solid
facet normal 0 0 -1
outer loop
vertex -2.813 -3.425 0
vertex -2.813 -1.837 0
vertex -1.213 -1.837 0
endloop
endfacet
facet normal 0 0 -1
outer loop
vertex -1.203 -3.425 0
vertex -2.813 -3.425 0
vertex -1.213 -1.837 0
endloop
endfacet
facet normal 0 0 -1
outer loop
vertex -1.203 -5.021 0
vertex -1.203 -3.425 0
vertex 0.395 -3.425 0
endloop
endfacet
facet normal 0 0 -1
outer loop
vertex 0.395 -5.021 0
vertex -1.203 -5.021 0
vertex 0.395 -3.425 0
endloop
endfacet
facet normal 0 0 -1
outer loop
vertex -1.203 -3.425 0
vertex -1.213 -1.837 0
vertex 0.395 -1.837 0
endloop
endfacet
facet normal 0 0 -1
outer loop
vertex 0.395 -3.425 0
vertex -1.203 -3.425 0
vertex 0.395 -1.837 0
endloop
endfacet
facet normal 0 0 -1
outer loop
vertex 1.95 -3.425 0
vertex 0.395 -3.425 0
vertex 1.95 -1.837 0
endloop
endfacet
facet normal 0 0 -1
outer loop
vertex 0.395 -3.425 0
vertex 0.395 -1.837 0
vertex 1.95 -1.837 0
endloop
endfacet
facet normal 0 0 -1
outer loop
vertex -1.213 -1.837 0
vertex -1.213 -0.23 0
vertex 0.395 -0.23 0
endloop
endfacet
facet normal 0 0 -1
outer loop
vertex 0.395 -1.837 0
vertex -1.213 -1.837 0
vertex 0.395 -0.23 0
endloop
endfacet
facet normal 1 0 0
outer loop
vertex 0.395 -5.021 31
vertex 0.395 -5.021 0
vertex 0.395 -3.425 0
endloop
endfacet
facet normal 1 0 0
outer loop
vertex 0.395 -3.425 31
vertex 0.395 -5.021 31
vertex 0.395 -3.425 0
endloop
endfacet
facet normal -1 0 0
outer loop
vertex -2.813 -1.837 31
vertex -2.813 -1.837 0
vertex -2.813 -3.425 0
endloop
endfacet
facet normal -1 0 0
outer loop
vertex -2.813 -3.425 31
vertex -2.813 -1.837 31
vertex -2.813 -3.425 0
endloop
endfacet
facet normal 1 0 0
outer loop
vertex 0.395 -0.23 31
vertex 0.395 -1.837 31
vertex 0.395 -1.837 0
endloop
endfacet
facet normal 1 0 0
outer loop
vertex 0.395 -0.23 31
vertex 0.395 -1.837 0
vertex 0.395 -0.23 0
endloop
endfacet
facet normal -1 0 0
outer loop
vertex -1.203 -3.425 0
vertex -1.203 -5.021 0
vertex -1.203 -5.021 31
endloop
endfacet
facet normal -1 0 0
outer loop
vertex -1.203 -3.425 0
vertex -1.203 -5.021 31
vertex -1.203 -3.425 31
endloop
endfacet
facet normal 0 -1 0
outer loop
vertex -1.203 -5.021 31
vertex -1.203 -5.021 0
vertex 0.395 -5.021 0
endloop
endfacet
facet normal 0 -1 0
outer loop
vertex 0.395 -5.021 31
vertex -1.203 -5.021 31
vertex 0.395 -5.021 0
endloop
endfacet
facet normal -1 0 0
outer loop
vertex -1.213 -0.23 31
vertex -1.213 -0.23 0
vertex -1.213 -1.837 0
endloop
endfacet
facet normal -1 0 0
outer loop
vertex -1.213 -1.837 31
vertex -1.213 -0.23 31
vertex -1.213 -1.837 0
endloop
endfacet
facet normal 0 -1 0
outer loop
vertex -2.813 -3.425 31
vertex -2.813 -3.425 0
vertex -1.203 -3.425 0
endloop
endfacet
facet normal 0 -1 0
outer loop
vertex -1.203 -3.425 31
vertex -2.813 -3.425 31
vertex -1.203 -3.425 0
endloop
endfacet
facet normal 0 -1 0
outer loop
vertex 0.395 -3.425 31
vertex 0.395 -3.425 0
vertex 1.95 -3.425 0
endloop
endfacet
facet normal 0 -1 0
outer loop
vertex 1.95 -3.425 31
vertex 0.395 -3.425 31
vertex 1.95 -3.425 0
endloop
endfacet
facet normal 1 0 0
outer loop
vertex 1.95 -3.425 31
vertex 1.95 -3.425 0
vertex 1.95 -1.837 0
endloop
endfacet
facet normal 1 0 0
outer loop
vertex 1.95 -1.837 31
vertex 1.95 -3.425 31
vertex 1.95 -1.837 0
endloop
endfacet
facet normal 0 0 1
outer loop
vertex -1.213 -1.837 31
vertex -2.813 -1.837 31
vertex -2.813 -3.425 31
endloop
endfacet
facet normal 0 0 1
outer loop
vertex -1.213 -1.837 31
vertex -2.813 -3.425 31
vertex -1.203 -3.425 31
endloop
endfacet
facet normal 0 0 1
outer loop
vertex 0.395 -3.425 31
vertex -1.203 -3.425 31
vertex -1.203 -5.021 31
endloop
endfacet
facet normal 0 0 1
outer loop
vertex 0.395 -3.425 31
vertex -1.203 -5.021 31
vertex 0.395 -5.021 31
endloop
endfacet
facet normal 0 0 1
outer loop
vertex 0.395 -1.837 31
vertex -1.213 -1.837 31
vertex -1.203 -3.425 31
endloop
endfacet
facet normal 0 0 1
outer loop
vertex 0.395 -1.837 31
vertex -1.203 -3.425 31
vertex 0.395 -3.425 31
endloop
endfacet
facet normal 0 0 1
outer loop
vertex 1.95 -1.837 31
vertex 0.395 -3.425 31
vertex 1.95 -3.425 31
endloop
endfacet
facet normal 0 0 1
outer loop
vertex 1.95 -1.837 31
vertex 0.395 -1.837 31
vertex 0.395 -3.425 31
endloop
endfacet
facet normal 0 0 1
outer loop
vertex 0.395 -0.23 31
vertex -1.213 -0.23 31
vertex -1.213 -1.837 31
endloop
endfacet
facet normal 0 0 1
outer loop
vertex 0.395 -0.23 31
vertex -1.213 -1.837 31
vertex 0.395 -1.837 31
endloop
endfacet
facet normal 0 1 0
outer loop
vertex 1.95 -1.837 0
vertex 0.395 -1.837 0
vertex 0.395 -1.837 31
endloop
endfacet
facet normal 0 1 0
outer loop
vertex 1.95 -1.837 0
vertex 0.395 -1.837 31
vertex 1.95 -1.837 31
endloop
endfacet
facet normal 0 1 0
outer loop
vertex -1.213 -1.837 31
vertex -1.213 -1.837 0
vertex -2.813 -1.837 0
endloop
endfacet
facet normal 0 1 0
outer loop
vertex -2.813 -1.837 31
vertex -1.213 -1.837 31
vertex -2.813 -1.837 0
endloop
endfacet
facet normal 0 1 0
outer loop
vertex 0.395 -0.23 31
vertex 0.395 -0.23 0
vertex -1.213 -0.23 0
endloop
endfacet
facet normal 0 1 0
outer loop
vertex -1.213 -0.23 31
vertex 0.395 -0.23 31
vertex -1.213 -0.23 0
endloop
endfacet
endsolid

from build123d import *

# Parameters (mm, degrees)
F0_W     = 1.598067
F0_H     = 1.596714
F0_W_2   = 1.554564
F0_H_2   = 1.5875
F1_DEPTH = 30.999938


with BuildPart() as f1:
    # F0 (on Top) → F1 (new body)
    with BuildSketch(Plane.XY):
        Polygon((-1.21276, -1.837012), (-2.81296, -1.837012), (-2.81296, -3.424512), (-1.203091, -3.424512), (0.394976, -3.424512), (0.394976, -1.837012), (0.34934, -1.837012), align=None)
        Polygon((-1.21276, -0.229868), (-1.21276, -1.837012), (0.34934, -1.837012), (0.394976, -1.837012), (0.394976, -0.229868), align=None)
        with Locations((-0.404057, -4.222869)):
            Rectangle(F0_W, F0_H)
        with Locations((1.172258, -2.630762)):
            Rectangle(F0_W_2, F0_H_2)
    extrude(amount=F1_DEPTH)


solid = f1.part
